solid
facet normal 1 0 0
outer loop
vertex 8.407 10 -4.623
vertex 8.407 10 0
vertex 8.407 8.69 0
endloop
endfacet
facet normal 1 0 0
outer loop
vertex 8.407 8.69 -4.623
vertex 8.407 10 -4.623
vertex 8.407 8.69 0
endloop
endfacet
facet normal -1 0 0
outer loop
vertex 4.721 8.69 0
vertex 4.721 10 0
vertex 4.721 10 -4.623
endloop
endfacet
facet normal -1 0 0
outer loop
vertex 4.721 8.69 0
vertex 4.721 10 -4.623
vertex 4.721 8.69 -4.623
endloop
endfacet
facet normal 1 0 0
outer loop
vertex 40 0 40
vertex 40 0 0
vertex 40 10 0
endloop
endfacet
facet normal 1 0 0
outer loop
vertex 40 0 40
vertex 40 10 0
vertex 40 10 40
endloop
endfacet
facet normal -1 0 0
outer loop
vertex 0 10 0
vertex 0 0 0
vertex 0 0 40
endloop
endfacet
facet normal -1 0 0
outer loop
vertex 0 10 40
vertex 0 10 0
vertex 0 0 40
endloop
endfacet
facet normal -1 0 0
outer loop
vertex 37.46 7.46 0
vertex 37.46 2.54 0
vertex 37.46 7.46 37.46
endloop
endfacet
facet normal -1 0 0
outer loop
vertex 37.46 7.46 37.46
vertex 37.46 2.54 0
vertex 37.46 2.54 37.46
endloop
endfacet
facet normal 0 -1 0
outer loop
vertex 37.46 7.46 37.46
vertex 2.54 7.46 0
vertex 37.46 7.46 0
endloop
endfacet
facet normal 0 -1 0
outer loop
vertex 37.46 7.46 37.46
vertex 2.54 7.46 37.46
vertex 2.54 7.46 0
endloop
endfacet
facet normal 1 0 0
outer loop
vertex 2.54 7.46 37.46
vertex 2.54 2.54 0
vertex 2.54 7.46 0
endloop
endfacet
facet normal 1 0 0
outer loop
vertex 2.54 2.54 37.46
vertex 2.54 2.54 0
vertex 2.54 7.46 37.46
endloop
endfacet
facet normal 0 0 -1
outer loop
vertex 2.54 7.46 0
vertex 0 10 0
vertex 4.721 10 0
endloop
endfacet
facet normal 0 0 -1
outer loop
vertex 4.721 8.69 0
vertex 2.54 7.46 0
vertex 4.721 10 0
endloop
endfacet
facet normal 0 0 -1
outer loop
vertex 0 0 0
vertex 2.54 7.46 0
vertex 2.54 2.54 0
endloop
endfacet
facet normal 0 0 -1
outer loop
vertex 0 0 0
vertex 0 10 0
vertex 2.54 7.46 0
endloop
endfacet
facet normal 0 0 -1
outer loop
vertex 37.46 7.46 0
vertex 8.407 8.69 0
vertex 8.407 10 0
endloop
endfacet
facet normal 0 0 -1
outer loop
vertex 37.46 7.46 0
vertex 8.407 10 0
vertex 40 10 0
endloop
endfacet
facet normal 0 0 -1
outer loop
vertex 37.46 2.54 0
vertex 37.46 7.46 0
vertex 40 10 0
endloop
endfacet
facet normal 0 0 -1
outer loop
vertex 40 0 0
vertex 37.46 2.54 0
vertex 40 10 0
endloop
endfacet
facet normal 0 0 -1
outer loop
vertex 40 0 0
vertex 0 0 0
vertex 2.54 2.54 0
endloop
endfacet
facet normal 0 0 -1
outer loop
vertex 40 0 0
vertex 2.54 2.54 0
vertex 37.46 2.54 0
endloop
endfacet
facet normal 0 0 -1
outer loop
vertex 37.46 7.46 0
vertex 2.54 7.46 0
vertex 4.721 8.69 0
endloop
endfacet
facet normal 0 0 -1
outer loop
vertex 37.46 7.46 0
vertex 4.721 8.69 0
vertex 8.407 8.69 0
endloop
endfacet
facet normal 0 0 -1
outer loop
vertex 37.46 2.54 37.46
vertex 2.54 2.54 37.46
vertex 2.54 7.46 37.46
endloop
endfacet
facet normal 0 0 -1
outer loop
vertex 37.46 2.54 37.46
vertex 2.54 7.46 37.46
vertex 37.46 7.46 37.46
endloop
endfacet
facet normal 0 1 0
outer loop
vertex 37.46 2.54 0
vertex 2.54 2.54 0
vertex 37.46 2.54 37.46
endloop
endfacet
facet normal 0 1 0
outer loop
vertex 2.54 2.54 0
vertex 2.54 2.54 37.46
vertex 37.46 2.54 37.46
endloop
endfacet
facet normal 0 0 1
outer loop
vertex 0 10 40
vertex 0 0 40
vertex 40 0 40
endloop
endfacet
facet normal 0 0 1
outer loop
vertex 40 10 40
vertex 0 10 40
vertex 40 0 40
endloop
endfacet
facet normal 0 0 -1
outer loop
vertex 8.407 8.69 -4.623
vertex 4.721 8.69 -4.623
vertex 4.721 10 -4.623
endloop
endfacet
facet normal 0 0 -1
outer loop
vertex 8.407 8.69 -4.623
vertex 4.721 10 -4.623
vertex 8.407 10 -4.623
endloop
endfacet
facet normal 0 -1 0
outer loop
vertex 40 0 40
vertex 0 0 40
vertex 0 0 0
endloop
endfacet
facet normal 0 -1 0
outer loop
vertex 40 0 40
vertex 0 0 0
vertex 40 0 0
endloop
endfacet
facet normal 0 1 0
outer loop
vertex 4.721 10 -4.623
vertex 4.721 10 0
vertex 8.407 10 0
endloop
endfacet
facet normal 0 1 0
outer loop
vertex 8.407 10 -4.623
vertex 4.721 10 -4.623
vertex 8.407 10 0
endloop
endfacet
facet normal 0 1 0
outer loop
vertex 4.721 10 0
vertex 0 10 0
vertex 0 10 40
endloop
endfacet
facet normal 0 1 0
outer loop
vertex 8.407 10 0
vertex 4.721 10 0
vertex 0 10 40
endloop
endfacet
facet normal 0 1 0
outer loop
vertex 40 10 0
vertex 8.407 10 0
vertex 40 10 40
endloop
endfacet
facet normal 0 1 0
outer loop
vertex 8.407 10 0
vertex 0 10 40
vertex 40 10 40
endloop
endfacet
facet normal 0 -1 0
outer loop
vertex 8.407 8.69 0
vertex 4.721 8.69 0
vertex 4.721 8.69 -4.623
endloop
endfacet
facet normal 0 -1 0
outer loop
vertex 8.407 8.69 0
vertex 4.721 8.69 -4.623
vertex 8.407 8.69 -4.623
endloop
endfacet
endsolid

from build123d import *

# Parameters (mm, degrees)
F0_W     = 40
F0_H     = 40
F1_DEPTH = 10
F2_T     = -2.54
F3_W     = 3.686494
F3_H     = 1.30985
F4_DEPTH = 4.6228


with BuildPart() as f1:
    # F0 (on Front) → F1 (new body)
    with BuildSketch(Plane.XZ):
        with Locations((20, 20)):
            Rectangle(F0_W, F0_H)
    extrude(amount=-F1_DEPTH)

    # F2
    f2_openings = [f1.faces().sort_by_distance(p)[0] for p in [
        (20, 5, 0),
    ]]
    offset(amount=F2_T, openings=f2_openings)

    # F3 (on face) → F4 (join)
    with BuildSketch(Plane(origin=(0, 0, 0), x_dir=(1, 0, 0), z_dir=(0, 0, -1))):
        with Locations((6.564244, -9.345075)):
            Rectangle(F3_W, F3_H)
    extrude(amount=F4_DEPTH)


solid = f1.part
